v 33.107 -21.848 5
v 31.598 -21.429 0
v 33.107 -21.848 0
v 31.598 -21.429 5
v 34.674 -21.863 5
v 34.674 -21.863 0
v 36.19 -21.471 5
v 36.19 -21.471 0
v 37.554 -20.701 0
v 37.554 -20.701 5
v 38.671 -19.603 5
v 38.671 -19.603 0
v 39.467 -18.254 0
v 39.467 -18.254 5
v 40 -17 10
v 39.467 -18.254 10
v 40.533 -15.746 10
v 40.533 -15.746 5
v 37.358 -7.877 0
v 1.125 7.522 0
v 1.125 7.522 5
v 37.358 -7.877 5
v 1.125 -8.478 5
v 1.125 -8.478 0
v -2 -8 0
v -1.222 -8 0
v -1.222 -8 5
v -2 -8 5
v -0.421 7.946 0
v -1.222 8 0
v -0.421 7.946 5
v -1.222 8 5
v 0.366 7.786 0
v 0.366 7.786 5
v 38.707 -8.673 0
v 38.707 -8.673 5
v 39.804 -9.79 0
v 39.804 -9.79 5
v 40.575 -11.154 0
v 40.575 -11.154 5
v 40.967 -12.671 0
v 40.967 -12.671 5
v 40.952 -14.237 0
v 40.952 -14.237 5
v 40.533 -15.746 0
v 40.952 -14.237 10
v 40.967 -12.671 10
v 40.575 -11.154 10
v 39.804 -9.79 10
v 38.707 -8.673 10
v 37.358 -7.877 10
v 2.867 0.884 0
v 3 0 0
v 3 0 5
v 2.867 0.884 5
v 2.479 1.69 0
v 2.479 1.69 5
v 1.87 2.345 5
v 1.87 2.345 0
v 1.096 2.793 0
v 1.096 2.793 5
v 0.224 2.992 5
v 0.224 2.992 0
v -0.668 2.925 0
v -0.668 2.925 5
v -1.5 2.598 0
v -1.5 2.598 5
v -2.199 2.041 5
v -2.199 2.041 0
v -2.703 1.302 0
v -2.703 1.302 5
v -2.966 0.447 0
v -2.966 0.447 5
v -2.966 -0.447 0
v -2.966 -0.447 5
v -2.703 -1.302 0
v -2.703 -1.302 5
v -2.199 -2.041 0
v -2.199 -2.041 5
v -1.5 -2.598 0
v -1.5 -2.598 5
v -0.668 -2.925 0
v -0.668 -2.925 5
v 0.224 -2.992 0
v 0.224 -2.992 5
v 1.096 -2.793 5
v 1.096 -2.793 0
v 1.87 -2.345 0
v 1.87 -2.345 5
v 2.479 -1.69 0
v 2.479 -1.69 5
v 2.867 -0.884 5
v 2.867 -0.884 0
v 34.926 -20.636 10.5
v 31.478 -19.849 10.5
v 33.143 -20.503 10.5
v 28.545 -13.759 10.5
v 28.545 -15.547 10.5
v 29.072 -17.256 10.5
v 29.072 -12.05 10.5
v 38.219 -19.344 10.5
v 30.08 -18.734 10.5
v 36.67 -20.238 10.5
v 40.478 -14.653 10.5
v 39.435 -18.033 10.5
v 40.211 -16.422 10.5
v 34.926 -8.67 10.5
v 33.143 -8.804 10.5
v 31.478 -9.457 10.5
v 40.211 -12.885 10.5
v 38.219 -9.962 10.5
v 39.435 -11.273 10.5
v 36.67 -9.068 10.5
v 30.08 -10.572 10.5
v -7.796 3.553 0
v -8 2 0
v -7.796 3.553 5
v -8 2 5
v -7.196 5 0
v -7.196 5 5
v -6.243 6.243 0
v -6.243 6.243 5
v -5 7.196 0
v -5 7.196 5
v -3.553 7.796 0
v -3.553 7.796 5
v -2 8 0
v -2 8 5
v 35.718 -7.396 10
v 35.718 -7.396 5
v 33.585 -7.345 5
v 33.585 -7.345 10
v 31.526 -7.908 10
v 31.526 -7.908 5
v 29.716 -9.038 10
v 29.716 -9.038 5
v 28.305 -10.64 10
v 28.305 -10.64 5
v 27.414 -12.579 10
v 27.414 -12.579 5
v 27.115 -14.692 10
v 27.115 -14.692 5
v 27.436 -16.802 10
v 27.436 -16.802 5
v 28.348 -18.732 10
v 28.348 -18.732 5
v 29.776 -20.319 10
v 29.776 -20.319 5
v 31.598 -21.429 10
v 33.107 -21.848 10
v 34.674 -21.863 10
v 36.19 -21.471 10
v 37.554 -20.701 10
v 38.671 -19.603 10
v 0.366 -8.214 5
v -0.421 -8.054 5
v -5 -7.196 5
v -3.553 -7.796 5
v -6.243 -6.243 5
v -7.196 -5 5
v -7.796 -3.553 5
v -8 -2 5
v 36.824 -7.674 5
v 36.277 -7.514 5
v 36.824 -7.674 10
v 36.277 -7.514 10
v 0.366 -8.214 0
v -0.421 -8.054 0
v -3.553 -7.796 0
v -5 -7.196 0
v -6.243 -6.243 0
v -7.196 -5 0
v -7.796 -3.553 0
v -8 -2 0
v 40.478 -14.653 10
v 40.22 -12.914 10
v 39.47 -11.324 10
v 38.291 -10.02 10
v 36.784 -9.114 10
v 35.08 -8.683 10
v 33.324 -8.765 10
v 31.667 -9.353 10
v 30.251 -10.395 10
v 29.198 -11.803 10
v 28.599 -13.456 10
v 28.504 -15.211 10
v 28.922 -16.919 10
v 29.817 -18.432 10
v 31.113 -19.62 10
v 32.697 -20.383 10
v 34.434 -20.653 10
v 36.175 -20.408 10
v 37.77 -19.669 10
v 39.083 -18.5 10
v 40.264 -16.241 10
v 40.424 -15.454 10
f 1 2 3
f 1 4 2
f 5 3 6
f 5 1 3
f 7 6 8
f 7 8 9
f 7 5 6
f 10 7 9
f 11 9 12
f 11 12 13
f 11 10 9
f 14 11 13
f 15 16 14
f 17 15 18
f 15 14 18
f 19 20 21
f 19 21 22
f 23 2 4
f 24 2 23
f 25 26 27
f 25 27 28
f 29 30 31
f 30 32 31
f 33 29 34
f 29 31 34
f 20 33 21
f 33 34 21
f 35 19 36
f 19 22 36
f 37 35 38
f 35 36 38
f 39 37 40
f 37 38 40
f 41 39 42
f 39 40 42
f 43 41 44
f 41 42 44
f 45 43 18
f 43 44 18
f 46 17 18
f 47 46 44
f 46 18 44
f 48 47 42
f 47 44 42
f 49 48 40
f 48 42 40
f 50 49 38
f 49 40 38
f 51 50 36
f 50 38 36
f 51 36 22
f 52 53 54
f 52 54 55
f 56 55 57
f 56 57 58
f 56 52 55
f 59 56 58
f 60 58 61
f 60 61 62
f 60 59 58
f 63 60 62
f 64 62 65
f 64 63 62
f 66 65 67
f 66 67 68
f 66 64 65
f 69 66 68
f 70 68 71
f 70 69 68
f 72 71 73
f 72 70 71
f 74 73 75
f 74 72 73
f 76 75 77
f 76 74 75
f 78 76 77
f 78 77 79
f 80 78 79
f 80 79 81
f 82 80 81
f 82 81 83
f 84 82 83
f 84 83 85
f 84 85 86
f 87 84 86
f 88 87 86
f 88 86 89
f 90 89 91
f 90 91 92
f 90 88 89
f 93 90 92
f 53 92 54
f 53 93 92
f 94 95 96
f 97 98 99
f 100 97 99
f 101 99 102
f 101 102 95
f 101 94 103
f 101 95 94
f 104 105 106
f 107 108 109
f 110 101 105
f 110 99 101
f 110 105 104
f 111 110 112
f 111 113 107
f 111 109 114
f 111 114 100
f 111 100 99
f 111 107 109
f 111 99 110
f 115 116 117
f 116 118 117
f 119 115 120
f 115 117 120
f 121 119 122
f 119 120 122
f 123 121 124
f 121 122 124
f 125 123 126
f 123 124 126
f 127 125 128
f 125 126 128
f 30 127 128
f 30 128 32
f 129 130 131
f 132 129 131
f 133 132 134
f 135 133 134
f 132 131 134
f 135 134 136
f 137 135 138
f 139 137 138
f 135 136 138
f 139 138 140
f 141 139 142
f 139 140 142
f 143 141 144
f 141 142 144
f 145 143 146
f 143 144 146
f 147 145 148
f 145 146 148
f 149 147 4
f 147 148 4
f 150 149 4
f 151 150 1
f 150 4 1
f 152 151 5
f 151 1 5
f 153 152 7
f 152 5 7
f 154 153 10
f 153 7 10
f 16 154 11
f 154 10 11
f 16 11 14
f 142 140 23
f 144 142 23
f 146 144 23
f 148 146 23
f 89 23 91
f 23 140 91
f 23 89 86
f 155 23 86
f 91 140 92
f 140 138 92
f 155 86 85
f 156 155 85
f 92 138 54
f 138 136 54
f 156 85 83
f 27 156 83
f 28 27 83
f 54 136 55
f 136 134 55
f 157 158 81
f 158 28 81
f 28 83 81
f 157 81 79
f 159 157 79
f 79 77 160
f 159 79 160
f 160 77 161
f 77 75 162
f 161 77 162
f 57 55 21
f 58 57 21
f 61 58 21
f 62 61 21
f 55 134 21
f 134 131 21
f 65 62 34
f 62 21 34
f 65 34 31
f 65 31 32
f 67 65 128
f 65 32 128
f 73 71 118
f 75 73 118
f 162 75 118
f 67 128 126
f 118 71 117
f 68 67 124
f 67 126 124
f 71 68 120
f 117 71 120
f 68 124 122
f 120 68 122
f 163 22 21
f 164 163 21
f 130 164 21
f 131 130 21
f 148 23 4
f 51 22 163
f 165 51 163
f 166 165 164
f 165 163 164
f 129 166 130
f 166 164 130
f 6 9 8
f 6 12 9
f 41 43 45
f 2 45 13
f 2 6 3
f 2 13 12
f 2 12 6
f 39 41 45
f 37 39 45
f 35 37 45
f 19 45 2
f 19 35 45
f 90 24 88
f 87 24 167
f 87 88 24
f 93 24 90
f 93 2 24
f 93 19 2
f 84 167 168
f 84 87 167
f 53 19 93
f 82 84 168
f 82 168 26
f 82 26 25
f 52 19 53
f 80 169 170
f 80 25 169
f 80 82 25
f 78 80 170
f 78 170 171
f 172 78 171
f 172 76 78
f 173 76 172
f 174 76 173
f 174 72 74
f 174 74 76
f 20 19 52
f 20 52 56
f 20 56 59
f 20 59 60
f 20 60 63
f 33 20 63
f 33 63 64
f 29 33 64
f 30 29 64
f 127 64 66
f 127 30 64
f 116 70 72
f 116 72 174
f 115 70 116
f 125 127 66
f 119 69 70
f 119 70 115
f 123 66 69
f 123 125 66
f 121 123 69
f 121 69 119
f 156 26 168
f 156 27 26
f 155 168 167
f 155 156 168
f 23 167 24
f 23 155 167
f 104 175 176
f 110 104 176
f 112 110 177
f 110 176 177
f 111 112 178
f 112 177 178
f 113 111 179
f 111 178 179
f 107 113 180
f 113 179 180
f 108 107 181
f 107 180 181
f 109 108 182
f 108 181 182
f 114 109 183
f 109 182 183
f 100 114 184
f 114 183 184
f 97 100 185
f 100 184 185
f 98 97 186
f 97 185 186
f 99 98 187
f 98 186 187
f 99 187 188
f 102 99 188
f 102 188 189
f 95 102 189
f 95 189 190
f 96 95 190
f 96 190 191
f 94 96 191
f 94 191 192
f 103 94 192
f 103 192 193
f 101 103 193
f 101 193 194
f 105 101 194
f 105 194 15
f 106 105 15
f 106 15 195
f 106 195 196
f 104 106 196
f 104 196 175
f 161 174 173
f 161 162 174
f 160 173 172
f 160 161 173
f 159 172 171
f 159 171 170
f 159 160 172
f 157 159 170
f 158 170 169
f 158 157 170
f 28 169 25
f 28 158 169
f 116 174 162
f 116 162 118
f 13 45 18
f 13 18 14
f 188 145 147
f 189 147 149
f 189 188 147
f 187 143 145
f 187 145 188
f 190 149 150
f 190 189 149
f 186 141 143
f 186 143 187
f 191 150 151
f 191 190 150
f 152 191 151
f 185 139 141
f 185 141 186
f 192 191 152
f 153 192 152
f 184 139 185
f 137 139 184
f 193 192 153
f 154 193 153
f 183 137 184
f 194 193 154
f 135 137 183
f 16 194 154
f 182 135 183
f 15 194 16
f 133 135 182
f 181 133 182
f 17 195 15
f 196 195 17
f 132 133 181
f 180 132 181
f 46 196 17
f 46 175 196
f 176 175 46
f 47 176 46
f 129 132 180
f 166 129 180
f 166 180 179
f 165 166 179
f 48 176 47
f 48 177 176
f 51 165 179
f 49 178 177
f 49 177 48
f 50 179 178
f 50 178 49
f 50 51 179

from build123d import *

# Parameters (mm, degrees)
ESBO_O1_R                = 3
RESSALTO_EXTRUS_O1_DEPTH = 5
FILETE1_R                = 6
RESSALTO_EXTRUS_O2_DEPTH = 5
ESBO_O3_R                = 6
RESSALTO_EXTRUS_O3_DEPTH = 0.5


with BuildPart() as part:
    # Esboço1 → Ressalto-extrusão1 (new body)
    with BuildSketch(Plane.XY):
        Polygon((-8, -8), (-8, 8), (0, 8), (42.879830598, -10.223928004), (37.120169402, -23.776071996), (0, -8), align=None)
        Circle(ESBO_O1_R, mode=Mode.SUBTRACT)
    extrude(amount=RESSALTO_EXTRUS_O1_DEPTH)

    # Filete1
    filete1_edges = [part.edges().sort_by_distance(p)[0] for p in [
        (-8, -8, 2.5),
        (0, -8, 2.5),
        (37.120169402, -23.776071996, 2.5),
        (42.879830598, -10.223928004, 2.5),
        (0, 8, 2.5),
        (-8, 8, 2.5),
    ]]
    fillet(filete1_edges, radius=FILETE1_R)

    # Esboço2 → Ressalto-extrusão2 (add)
    with BuildSketch(Plane.XY.offset(5)):
        with BuildLine():
            Line((39.467013244, -18.254086485), (40.532986756, -15.745913515))
            ThreePointArc((40.532986756, -15.745913515), (40.575103841, -11.153905468), (37.357845087, -7.877084162))
            ThreePointArc((37.357845087, -7.877084162), (36.552086472, -7.588681558), (35.718304651, -7.395728495))
            ThreePointArc((35.718304651, -7.395728495), (27.413539889, -12.579084175), (31.598183891, -21.429228154))
            ThreePointArc((31.598183891, -21.429228154), (36.190191938, -21.471345238), (39.467013244, -18.254086485))
        make_face()
    extrude(amount=RESSALTO_EXTRUS_O2_DEPTH)

    # Esboço3 → Ressalto-extrusão3 (add)
    with BuildSketch(Plane.XY.offset(10)):
        with Locations((34.478014489, -14.653156158)):
            Circle(ESBO_O3_R)
    extrude(amount=RESSALTO_EXTRUS_O3_DEPTH)


solid = part.part
